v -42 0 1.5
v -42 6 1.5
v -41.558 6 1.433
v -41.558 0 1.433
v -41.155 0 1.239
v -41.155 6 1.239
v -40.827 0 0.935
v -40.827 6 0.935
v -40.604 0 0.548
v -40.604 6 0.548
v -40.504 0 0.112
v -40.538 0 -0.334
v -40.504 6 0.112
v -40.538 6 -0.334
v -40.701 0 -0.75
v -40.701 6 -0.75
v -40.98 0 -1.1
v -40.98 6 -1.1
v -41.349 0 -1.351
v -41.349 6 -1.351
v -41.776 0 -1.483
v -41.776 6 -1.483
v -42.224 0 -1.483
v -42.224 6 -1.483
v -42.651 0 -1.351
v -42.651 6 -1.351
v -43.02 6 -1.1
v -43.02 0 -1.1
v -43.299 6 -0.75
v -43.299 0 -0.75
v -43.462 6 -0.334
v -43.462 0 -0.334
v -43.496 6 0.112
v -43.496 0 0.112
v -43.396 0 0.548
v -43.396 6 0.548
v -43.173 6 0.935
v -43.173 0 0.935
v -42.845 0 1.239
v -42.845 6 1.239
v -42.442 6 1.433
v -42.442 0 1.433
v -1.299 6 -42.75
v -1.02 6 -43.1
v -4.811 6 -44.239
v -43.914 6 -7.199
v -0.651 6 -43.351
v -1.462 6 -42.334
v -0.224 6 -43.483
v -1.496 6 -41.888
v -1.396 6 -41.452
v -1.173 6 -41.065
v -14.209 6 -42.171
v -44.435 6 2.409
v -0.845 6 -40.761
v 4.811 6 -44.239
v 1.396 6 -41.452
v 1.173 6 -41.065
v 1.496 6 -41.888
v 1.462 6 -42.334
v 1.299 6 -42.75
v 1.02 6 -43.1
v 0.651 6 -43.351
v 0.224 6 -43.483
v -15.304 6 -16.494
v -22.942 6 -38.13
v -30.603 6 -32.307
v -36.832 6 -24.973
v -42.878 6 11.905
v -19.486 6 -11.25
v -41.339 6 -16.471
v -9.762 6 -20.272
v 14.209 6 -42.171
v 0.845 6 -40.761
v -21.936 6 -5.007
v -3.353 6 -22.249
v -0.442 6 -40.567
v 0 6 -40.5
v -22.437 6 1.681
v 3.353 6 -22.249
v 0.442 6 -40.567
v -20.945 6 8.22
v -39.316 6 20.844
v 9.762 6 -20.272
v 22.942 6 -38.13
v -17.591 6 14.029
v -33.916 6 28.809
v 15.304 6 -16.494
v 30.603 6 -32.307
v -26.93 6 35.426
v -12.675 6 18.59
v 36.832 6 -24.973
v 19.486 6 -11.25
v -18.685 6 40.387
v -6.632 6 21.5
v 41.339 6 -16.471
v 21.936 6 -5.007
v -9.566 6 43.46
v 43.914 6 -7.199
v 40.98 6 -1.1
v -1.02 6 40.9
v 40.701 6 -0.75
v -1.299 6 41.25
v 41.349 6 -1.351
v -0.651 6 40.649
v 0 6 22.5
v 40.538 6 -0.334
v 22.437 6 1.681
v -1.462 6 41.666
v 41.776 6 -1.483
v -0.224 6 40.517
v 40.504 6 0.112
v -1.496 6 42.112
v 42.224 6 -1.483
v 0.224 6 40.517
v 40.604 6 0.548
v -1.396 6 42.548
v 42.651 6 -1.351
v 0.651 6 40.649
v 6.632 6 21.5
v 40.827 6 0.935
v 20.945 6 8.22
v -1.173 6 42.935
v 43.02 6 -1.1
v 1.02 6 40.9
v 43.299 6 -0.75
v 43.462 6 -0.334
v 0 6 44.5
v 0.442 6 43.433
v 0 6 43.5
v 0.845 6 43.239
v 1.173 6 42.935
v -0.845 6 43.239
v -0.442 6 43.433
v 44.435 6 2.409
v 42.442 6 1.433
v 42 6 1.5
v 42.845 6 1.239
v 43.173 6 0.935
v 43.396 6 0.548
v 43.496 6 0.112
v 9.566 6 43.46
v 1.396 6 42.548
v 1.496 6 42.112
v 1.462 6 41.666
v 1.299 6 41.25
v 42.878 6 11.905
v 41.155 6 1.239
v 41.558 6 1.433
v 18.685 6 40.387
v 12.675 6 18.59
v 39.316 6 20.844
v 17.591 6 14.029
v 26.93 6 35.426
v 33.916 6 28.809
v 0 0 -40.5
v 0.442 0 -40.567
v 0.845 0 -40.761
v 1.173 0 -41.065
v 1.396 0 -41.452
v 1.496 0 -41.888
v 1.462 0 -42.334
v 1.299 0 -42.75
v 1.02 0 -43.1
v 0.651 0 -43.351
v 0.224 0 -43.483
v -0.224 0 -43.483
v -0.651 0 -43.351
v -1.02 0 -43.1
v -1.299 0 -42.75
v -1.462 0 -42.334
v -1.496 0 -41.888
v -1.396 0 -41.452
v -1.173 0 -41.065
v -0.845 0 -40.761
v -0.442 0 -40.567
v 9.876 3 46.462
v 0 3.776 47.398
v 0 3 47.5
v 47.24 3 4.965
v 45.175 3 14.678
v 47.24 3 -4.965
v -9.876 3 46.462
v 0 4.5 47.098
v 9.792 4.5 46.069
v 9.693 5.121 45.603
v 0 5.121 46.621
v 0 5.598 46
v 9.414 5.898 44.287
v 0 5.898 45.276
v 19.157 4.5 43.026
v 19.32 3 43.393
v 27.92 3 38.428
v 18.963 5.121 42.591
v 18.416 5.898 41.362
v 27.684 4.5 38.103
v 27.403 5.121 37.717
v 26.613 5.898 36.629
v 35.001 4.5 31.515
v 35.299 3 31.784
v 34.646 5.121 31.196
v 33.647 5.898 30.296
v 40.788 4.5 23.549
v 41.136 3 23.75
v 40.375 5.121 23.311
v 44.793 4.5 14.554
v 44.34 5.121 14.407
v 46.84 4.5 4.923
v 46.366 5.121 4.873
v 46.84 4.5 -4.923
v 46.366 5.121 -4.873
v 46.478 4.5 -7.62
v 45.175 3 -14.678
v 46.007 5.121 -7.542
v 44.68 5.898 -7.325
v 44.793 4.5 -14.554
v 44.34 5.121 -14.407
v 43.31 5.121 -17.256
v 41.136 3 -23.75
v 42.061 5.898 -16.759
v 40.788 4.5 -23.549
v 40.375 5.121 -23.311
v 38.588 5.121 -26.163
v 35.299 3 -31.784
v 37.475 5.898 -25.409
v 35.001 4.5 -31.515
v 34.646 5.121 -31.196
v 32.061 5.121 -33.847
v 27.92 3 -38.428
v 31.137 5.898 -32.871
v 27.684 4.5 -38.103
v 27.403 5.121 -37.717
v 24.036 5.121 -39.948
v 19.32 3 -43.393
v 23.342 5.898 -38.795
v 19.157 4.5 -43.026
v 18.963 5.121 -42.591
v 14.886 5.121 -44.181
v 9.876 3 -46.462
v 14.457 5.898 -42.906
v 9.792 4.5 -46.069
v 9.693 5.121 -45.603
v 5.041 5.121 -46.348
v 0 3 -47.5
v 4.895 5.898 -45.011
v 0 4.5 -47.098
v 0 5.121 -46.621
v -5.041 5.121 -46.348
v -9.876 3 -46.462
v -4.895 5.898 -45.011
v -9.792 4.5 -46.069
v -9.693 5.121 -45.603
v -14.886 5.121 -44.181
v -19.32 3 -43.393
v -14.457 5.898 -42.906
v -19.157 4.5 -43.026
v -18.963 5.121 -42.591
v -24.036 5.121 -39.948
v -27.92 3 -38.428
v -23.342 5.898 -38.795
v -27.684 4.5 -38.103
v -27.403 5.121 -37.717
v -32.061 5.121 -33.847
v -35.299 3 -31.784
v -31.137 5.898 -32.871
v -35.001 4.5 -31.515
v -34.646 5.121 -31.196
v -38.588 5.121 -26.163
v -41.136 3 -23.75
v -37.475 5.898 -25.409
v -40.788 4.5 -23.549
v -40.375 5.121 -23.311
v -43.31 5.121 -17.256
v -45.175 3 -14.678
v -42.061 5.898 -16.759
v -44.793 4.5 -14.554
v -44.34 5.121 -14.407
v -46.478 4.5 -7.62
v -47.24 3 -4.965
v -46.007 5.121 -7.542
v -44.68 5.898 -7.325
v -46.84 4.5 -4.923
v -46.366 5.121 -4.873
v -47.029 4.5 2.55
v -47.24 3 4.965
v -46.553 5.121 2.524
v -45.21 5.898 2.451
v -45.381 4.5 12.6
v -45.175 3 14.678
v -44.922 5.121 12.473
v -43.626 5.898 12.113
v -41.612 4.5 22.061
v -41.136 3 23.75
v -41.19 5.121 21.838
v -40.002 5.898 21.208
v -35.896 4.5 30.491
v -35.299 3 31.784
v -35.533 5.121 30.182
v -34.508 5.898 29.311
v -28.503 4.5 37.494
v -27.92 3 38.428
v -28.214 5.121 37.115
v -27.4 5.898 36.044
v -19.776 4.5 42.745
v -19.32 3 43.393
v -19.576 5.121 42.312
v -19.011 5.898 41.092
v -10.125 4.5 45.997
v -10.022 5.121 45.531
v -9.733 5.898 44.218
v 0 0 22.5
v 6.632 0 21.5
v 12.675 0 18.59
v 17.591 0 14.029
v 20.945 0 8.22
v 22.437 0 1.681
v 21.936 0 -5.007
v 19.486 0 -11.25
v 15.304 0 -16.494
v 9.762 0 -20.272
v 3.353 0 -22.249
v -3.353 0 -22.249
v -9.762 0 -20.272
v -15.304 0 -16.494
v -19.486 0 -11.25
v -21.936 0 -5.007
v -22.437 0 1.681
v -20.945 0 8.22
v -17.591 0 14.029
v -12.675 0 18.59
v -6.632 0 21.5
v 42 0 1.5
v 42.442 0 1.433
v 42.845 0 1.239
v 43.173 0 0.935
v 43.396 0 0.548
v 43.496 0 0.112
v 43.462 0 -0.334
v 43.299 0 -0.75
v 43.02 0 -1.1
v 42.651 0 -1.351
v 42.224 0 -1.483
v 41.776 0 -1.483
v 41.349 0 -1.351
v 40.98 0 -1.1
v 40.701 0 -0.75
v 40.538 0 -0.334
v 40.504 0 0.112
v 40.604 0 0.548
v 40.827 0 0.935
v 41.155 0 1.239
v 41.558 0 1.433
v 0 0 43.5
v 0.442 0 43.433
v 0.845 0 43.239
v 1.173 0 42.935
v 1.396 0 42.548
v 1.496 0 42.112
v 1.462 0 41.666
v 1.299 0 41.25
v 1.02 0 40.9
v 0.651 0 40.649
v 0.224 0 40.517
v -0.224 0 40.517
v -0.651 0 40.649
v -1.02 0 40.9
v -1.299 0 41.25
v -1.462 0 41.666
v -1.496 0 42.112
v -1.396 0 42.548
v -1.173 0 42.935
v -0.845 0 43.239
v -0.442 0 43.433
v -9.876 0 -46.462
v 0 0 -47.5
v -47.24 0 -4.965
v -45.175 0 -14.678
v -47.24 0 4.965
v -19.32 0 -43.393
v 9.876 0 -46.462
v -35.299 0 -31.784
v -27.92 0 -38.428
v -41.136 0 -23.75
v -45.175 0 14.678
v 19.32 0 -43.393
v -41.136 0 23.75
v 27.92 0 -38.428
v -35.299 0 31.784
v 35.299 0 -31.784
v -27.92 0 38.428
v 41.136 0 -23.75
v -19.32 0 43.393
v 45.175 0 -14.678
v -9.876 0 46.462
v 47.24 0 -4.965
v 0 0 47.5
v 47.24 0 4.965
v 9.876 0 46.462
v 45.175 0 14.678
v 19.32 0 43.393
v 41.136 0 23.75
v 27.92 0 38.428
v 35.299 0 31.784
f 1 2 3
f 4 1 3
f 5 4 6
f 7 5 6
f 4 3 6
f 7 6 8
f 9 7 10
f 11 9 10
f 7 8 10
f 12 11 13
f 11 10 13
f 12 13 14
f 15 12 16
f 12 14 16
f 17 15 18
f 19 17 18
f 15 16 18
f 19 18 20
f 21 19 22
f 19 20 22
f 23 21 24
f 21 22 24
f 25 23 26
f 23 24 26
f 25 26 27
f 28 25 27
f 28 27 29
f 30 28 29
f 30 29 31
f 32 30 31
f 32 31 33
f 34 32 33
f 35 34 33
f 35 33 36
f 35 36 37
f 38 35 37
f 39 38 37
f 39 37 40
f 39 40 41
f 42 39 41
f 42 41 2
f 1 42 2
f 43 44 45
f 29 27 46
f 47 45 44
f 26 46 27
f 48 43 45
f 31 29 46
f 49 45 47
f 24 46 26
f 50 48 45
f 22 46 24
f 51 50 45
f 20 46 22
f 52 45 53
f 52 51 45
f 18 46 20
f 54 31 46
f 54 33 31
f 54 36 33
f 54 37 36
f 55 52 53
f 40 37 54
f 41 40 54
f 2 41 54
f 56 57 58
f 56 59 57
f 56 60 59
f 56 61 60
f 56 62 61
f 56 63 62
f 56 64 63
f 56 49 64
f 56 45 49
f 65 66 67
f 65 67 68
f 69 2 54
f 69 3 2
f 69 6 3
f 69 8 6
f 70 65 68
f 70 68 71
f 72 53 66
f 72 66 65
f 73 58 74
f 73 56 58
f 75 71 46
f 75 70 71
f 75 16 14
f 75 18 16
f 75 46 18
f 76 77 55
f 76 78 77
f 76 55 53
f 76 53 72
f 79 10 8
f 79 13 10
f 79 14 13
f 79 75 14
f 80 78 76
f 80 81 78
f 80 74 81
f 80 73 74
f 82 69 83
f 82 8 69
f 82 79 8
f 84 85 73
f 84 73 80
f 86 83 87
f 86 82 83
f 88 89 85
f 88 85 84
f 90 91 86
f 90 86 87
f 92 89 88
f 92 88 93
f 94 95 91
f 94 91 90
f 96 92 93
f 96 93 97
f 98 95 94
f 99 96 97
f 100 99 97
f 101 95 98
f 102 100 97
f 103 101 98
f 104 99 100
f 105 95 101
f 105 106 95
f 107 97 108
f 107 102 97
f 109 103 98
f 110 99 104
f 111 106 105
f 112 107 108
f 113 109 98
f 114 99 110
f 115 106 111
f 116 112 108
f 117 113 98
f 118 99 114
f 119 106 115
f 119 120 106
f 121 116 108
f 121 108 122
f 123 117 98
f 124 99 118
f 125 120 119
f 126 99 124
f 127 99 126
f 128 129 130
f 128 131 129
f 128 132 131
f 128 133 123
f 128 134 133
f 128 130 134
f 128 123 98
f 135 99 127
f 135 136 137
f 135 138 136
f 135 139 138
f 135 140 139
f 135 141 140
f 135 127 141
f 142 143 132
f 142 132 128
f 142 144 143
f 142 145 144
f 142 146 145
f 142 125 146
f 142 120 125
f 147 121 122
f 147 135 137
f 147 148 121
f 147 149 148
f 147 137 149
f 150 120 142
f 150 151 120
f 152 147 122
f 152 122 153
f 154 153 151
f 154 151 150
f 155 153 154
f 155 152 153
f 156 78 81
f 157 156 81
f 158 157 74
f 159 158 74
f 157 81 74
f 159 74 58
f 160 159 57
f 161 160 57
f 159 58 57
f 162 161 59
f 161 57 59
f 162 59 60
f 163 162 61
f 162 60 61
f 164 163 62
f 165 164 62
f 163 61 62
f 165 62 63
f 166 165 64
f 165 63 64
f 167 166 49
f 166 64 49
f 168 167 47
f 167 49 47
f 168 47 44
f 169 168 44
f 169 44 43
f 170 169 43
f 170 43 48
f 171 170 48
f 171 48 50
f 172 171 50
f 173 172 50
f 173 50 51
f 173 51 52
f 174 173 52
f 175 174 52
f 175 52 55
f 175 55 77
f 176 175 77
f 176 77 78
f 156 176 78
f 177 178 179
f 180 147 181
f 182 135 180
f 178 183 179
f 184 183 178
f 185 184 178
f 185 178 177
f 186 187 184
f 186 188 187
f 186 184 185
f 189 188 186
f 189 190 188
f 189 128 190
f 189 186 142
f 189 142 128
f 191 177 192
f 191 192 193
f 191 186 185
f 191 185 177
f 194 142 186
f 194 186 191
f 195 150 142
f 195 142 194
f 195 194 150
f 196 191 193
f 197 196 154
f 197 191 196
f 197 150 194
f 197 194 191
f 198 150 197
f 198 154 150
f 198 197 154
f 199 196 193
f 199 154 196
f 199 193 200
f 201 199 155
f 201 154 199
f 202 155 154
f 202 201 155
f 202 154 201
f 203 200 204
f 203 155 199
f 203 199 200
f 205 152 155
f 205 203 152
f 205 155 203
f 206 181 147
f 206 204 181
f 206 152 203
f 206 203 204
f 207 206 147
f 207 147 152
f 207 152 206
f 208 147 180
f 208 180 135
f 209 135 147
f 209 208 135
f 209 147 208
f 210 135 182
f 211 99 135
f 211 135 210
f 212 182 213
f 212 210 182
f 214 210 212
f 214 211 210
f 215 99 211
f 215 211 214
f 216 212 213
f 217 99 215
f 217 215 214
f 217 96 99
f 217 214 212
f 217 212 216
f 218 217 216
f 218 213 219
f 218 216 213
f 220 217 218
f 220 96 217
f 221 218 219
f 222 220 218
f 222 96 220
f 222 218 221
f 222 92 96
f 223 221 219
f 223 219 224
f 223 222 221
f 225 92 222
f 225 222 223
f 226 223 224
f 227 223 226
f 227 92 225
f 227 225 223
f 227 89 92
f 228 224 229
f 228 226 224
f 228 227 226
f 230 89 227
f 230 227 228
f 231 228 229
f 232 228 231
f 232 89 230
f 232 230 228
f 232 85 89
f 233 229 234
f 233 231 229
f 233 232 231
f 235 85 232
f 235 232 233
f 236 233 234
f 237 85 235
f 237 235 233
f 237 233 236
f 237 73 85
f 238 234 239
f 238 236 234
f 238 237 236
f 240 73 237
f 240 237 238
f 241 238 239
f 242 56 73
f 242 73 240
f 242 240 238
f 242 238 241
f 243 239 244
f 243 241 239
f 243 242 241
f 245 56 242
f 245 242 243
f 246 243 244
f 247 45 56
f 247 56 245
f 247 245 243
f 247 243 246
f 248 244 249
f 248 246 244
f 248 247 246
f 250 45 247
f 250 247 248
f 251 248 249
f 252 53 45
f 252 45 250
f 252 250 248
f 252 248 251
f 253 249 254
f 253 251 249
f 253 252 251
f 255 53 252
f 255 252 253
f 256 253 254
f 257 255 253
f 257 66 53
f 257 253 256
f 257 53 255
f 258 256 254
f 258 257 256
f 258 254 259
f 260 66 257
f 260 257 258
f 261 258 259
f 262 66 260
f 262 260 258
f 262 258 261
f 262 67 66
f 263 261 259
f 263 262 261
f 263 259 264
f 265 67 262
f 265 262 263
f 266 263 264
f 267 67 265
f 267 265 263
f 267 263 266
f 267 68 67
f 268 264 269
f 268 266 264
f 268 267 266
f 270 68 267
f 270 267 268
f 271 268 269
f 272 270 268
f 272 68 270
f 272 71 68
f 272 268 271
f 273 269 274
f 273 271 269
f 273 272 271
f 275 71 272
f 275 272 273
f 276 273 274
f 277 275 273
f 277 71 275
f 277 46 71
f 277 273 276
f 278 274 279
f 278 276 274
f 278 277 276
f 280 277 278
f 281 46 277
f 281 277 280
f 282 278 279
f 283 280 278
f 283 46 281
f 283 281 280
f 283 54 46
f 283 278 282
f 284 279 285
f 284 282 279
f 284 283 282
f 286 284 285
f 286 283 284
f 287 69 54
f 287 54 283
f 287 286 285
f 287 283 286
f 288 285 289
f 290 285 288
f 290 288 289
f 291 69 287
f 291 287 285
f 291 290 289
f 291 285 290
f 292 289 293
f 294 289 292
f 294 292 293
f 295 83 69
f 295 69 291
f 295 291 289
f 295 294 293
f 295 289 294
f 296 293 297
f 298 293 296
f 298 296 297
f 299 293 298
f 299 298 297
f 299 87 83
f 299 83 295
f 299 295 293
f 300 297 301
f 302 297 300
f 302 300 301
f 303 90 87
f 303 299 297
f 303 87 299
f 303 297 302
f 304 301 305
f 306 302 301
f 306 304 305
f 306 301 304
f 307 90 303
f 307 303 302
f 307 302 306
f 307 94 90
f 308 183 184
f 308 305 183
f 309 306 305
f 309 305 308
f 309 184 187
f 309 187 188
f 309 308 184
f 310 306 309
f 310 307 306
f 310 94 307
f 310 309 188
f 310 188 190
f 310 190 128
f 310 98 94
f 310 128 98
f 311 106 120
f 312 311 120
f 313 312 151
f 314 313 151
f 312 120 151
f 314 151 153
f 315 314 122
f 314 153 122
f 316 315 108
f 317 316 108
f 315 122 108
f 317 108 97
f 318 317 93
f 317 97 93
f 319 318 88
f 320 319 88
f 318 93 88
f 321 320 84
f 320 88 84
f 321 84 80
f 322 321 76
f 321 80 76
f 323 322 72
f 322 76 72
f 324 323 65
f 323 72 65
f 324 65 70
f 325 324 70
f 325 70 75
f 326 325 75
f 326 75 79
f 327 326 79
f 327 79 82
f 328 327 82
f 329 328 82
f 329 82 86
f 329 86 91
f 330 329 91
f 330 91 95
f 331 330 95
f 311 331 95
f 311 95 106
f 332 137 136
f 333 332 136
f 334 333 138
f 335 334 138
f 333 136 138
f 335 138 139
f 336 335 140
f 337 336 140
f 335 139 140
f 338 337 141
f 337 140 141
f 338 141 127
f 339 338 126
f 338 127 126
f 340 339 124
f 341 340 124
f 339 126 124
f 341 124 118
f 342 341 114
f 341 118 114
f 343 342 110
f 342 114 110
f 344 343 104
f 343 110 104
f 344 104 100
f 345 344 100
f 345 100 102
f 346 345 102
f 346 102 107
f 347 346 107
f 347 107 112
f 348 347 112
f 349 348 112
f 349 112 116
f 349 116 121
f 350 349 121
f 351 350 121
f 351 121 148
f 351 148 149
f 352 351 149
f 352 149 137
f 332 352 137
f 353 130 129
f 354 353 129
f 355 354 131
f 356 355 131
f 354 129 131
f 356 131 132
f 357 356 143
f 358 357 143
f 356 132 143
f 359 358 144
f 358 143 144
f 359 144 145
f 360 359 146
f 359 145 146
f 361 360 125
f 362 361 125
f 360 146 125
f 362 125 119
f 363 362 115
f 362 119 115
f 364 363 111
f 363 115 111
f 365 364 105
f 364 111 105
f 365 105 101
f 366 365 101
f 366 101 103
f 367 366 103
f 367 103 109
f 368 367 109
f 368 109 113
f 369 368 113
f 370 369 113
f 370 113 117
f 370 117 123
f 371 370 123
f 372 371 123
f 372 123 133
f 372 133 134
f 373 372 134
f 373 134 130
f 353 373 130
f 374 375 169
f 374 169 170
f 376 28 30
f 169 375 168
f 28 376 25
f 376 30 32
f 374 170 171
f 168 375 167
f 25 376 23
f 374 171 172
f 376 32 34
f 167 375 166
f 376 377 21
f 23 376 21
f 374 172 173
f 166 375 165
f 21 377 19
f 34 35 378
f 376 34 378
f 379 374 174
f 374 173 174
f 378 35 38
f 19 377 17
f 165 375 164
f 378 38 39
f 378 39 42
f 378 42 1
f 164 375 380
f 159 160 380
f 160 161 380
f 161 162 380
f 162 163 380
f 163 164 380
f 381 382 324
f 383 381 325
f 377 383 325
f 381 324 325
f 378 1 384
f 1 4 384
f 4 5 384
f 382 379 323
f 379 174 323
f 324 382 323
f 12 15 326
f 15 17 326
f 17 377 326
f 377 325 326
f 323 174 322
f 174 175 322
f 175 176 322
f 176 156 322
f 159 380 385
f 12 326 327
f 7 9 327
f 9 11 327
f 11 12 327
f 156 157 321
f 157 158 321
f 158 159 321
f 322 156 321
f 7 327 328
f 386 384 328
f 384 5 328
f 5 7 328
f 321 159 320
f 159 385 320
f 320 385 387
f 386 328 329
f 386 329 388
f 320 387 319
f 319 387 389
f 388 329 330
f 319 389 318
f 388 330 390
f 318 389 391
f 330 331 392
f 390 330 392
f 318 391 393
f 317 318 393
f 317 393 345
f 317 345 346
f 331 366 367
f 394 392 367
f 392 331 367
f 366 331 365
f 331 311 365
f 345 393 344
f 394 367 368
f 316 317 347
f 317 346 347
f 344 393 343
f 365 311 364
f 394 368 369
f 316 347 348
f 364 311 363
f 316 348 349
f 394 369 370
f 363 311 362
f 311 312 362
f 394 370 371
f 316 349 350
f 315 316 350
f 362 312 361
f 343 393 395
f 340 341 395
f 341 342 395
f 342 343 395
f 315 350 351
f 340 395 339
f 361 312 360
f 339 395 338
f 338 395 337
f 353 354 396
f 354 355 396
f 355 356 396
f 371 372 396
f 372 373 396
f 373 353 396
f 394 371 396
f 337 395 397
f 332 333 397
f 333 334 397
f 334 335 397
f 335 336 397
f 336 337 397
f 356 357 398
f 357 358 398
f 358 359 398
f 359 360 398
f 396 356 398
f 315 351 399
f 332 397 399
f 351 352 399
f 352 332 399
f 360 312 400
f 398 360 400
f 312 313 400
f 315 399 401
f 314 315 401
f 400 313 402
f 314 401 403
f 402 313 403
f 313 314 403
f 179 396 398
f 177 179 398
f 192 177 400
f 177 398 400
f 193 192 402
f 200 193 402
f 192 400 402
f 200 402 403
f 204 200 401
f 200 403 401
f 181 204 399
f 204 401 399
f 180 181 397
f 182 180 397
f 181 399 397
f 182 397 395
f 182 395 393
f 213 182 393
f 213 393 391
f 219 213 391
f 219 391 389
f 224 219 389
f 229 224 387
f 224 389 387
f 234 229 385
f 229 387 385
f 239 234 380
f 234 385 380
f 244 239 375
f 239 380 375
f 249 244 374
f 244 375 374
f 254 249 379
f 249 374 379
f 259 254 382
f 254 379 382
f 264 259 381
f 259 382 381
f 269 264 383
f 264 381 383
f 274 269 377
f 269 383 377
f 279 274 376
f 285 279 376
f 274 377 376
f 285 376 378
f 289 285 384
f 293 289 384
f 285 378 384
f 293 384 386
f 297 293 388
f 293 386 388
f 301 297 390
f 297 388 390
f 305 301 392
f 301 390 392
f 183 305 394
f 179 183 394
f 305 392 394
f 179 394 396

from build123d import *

# Parameters (mm, degrees)
SKETCH1_R           = 47.5
BOSS_EXTRUDE1_DEPTH = 6
SKETCH2_R           = 1.5
CUT_EXTRUDE1_DEPTH  = 68.44256816
SKETCH3_R           = 22.5
CUT_EXTRUDE2_DEPTH  = 68.44256816
FILLET1_R           = 3


with BuildPart() as part:
    # Sketch1 → Boss-Extrude1 (new body)
    with BuildSketch(Plane(origin=(0, 0, 0), x_dir=(1, 0, 0), z_dir=(0, 1, 0))):
        with Locations(Location((0, 0, 0), (0, 0, 270))):
            Circle(SKETCH1_R)
    extrude(amount=BOSS_EXTRUDE1_DEPTH)

    # Sketch2 → Cut-Extrude1 (cut, through all)
    with BuildSketch(Plane(origin=(0, 6, 0), x_dir=(1, 0, 0), z_dir=(0, 1, 0))):
        with Locations(Location((0, 42, 0), (0, 0, 270))):
            Circle(SKETCH2_R)
        with Locations(Location((42, 0, 0), (0, 0, 270))):
            Circle(SKETCH2_R)
        with Locations(Location((0, -42, 0), (0, 0, 270))):
            Circle(SKETCH2_R)
        with Locations(Location((-42, 0, 0), (0, 0, 270))):
            Circle(SKETCH2_R)
    extrude(amount=-CUT_EXTRUDE1_DEPTH, mode=Mode.SUBTRACT)

    # Sketch3 → Cut-Extrude2 (cut, through all)
    with BuildSketch(Plane(origin=(0, 6, 0), x_dir=(1, 0, 0), z_dir=(0, 1, 0))):
        with Locations(Location((0, 0, 0), (0, 0, 270))):
            Circle(SKETCH3_R)
    extrude(amount=-CUT_EXTRUDE2_DEPTH, mode=Mode.SUBTRACT)

    # Fillet1
    fillet1_edges = [part.edges().sort_by_distance(p)[0] for p in [
        (0, 6, -47.5),
    ]]
    fillet(fillet1_edges, radius=FILLET1_R)


solid = part.part
